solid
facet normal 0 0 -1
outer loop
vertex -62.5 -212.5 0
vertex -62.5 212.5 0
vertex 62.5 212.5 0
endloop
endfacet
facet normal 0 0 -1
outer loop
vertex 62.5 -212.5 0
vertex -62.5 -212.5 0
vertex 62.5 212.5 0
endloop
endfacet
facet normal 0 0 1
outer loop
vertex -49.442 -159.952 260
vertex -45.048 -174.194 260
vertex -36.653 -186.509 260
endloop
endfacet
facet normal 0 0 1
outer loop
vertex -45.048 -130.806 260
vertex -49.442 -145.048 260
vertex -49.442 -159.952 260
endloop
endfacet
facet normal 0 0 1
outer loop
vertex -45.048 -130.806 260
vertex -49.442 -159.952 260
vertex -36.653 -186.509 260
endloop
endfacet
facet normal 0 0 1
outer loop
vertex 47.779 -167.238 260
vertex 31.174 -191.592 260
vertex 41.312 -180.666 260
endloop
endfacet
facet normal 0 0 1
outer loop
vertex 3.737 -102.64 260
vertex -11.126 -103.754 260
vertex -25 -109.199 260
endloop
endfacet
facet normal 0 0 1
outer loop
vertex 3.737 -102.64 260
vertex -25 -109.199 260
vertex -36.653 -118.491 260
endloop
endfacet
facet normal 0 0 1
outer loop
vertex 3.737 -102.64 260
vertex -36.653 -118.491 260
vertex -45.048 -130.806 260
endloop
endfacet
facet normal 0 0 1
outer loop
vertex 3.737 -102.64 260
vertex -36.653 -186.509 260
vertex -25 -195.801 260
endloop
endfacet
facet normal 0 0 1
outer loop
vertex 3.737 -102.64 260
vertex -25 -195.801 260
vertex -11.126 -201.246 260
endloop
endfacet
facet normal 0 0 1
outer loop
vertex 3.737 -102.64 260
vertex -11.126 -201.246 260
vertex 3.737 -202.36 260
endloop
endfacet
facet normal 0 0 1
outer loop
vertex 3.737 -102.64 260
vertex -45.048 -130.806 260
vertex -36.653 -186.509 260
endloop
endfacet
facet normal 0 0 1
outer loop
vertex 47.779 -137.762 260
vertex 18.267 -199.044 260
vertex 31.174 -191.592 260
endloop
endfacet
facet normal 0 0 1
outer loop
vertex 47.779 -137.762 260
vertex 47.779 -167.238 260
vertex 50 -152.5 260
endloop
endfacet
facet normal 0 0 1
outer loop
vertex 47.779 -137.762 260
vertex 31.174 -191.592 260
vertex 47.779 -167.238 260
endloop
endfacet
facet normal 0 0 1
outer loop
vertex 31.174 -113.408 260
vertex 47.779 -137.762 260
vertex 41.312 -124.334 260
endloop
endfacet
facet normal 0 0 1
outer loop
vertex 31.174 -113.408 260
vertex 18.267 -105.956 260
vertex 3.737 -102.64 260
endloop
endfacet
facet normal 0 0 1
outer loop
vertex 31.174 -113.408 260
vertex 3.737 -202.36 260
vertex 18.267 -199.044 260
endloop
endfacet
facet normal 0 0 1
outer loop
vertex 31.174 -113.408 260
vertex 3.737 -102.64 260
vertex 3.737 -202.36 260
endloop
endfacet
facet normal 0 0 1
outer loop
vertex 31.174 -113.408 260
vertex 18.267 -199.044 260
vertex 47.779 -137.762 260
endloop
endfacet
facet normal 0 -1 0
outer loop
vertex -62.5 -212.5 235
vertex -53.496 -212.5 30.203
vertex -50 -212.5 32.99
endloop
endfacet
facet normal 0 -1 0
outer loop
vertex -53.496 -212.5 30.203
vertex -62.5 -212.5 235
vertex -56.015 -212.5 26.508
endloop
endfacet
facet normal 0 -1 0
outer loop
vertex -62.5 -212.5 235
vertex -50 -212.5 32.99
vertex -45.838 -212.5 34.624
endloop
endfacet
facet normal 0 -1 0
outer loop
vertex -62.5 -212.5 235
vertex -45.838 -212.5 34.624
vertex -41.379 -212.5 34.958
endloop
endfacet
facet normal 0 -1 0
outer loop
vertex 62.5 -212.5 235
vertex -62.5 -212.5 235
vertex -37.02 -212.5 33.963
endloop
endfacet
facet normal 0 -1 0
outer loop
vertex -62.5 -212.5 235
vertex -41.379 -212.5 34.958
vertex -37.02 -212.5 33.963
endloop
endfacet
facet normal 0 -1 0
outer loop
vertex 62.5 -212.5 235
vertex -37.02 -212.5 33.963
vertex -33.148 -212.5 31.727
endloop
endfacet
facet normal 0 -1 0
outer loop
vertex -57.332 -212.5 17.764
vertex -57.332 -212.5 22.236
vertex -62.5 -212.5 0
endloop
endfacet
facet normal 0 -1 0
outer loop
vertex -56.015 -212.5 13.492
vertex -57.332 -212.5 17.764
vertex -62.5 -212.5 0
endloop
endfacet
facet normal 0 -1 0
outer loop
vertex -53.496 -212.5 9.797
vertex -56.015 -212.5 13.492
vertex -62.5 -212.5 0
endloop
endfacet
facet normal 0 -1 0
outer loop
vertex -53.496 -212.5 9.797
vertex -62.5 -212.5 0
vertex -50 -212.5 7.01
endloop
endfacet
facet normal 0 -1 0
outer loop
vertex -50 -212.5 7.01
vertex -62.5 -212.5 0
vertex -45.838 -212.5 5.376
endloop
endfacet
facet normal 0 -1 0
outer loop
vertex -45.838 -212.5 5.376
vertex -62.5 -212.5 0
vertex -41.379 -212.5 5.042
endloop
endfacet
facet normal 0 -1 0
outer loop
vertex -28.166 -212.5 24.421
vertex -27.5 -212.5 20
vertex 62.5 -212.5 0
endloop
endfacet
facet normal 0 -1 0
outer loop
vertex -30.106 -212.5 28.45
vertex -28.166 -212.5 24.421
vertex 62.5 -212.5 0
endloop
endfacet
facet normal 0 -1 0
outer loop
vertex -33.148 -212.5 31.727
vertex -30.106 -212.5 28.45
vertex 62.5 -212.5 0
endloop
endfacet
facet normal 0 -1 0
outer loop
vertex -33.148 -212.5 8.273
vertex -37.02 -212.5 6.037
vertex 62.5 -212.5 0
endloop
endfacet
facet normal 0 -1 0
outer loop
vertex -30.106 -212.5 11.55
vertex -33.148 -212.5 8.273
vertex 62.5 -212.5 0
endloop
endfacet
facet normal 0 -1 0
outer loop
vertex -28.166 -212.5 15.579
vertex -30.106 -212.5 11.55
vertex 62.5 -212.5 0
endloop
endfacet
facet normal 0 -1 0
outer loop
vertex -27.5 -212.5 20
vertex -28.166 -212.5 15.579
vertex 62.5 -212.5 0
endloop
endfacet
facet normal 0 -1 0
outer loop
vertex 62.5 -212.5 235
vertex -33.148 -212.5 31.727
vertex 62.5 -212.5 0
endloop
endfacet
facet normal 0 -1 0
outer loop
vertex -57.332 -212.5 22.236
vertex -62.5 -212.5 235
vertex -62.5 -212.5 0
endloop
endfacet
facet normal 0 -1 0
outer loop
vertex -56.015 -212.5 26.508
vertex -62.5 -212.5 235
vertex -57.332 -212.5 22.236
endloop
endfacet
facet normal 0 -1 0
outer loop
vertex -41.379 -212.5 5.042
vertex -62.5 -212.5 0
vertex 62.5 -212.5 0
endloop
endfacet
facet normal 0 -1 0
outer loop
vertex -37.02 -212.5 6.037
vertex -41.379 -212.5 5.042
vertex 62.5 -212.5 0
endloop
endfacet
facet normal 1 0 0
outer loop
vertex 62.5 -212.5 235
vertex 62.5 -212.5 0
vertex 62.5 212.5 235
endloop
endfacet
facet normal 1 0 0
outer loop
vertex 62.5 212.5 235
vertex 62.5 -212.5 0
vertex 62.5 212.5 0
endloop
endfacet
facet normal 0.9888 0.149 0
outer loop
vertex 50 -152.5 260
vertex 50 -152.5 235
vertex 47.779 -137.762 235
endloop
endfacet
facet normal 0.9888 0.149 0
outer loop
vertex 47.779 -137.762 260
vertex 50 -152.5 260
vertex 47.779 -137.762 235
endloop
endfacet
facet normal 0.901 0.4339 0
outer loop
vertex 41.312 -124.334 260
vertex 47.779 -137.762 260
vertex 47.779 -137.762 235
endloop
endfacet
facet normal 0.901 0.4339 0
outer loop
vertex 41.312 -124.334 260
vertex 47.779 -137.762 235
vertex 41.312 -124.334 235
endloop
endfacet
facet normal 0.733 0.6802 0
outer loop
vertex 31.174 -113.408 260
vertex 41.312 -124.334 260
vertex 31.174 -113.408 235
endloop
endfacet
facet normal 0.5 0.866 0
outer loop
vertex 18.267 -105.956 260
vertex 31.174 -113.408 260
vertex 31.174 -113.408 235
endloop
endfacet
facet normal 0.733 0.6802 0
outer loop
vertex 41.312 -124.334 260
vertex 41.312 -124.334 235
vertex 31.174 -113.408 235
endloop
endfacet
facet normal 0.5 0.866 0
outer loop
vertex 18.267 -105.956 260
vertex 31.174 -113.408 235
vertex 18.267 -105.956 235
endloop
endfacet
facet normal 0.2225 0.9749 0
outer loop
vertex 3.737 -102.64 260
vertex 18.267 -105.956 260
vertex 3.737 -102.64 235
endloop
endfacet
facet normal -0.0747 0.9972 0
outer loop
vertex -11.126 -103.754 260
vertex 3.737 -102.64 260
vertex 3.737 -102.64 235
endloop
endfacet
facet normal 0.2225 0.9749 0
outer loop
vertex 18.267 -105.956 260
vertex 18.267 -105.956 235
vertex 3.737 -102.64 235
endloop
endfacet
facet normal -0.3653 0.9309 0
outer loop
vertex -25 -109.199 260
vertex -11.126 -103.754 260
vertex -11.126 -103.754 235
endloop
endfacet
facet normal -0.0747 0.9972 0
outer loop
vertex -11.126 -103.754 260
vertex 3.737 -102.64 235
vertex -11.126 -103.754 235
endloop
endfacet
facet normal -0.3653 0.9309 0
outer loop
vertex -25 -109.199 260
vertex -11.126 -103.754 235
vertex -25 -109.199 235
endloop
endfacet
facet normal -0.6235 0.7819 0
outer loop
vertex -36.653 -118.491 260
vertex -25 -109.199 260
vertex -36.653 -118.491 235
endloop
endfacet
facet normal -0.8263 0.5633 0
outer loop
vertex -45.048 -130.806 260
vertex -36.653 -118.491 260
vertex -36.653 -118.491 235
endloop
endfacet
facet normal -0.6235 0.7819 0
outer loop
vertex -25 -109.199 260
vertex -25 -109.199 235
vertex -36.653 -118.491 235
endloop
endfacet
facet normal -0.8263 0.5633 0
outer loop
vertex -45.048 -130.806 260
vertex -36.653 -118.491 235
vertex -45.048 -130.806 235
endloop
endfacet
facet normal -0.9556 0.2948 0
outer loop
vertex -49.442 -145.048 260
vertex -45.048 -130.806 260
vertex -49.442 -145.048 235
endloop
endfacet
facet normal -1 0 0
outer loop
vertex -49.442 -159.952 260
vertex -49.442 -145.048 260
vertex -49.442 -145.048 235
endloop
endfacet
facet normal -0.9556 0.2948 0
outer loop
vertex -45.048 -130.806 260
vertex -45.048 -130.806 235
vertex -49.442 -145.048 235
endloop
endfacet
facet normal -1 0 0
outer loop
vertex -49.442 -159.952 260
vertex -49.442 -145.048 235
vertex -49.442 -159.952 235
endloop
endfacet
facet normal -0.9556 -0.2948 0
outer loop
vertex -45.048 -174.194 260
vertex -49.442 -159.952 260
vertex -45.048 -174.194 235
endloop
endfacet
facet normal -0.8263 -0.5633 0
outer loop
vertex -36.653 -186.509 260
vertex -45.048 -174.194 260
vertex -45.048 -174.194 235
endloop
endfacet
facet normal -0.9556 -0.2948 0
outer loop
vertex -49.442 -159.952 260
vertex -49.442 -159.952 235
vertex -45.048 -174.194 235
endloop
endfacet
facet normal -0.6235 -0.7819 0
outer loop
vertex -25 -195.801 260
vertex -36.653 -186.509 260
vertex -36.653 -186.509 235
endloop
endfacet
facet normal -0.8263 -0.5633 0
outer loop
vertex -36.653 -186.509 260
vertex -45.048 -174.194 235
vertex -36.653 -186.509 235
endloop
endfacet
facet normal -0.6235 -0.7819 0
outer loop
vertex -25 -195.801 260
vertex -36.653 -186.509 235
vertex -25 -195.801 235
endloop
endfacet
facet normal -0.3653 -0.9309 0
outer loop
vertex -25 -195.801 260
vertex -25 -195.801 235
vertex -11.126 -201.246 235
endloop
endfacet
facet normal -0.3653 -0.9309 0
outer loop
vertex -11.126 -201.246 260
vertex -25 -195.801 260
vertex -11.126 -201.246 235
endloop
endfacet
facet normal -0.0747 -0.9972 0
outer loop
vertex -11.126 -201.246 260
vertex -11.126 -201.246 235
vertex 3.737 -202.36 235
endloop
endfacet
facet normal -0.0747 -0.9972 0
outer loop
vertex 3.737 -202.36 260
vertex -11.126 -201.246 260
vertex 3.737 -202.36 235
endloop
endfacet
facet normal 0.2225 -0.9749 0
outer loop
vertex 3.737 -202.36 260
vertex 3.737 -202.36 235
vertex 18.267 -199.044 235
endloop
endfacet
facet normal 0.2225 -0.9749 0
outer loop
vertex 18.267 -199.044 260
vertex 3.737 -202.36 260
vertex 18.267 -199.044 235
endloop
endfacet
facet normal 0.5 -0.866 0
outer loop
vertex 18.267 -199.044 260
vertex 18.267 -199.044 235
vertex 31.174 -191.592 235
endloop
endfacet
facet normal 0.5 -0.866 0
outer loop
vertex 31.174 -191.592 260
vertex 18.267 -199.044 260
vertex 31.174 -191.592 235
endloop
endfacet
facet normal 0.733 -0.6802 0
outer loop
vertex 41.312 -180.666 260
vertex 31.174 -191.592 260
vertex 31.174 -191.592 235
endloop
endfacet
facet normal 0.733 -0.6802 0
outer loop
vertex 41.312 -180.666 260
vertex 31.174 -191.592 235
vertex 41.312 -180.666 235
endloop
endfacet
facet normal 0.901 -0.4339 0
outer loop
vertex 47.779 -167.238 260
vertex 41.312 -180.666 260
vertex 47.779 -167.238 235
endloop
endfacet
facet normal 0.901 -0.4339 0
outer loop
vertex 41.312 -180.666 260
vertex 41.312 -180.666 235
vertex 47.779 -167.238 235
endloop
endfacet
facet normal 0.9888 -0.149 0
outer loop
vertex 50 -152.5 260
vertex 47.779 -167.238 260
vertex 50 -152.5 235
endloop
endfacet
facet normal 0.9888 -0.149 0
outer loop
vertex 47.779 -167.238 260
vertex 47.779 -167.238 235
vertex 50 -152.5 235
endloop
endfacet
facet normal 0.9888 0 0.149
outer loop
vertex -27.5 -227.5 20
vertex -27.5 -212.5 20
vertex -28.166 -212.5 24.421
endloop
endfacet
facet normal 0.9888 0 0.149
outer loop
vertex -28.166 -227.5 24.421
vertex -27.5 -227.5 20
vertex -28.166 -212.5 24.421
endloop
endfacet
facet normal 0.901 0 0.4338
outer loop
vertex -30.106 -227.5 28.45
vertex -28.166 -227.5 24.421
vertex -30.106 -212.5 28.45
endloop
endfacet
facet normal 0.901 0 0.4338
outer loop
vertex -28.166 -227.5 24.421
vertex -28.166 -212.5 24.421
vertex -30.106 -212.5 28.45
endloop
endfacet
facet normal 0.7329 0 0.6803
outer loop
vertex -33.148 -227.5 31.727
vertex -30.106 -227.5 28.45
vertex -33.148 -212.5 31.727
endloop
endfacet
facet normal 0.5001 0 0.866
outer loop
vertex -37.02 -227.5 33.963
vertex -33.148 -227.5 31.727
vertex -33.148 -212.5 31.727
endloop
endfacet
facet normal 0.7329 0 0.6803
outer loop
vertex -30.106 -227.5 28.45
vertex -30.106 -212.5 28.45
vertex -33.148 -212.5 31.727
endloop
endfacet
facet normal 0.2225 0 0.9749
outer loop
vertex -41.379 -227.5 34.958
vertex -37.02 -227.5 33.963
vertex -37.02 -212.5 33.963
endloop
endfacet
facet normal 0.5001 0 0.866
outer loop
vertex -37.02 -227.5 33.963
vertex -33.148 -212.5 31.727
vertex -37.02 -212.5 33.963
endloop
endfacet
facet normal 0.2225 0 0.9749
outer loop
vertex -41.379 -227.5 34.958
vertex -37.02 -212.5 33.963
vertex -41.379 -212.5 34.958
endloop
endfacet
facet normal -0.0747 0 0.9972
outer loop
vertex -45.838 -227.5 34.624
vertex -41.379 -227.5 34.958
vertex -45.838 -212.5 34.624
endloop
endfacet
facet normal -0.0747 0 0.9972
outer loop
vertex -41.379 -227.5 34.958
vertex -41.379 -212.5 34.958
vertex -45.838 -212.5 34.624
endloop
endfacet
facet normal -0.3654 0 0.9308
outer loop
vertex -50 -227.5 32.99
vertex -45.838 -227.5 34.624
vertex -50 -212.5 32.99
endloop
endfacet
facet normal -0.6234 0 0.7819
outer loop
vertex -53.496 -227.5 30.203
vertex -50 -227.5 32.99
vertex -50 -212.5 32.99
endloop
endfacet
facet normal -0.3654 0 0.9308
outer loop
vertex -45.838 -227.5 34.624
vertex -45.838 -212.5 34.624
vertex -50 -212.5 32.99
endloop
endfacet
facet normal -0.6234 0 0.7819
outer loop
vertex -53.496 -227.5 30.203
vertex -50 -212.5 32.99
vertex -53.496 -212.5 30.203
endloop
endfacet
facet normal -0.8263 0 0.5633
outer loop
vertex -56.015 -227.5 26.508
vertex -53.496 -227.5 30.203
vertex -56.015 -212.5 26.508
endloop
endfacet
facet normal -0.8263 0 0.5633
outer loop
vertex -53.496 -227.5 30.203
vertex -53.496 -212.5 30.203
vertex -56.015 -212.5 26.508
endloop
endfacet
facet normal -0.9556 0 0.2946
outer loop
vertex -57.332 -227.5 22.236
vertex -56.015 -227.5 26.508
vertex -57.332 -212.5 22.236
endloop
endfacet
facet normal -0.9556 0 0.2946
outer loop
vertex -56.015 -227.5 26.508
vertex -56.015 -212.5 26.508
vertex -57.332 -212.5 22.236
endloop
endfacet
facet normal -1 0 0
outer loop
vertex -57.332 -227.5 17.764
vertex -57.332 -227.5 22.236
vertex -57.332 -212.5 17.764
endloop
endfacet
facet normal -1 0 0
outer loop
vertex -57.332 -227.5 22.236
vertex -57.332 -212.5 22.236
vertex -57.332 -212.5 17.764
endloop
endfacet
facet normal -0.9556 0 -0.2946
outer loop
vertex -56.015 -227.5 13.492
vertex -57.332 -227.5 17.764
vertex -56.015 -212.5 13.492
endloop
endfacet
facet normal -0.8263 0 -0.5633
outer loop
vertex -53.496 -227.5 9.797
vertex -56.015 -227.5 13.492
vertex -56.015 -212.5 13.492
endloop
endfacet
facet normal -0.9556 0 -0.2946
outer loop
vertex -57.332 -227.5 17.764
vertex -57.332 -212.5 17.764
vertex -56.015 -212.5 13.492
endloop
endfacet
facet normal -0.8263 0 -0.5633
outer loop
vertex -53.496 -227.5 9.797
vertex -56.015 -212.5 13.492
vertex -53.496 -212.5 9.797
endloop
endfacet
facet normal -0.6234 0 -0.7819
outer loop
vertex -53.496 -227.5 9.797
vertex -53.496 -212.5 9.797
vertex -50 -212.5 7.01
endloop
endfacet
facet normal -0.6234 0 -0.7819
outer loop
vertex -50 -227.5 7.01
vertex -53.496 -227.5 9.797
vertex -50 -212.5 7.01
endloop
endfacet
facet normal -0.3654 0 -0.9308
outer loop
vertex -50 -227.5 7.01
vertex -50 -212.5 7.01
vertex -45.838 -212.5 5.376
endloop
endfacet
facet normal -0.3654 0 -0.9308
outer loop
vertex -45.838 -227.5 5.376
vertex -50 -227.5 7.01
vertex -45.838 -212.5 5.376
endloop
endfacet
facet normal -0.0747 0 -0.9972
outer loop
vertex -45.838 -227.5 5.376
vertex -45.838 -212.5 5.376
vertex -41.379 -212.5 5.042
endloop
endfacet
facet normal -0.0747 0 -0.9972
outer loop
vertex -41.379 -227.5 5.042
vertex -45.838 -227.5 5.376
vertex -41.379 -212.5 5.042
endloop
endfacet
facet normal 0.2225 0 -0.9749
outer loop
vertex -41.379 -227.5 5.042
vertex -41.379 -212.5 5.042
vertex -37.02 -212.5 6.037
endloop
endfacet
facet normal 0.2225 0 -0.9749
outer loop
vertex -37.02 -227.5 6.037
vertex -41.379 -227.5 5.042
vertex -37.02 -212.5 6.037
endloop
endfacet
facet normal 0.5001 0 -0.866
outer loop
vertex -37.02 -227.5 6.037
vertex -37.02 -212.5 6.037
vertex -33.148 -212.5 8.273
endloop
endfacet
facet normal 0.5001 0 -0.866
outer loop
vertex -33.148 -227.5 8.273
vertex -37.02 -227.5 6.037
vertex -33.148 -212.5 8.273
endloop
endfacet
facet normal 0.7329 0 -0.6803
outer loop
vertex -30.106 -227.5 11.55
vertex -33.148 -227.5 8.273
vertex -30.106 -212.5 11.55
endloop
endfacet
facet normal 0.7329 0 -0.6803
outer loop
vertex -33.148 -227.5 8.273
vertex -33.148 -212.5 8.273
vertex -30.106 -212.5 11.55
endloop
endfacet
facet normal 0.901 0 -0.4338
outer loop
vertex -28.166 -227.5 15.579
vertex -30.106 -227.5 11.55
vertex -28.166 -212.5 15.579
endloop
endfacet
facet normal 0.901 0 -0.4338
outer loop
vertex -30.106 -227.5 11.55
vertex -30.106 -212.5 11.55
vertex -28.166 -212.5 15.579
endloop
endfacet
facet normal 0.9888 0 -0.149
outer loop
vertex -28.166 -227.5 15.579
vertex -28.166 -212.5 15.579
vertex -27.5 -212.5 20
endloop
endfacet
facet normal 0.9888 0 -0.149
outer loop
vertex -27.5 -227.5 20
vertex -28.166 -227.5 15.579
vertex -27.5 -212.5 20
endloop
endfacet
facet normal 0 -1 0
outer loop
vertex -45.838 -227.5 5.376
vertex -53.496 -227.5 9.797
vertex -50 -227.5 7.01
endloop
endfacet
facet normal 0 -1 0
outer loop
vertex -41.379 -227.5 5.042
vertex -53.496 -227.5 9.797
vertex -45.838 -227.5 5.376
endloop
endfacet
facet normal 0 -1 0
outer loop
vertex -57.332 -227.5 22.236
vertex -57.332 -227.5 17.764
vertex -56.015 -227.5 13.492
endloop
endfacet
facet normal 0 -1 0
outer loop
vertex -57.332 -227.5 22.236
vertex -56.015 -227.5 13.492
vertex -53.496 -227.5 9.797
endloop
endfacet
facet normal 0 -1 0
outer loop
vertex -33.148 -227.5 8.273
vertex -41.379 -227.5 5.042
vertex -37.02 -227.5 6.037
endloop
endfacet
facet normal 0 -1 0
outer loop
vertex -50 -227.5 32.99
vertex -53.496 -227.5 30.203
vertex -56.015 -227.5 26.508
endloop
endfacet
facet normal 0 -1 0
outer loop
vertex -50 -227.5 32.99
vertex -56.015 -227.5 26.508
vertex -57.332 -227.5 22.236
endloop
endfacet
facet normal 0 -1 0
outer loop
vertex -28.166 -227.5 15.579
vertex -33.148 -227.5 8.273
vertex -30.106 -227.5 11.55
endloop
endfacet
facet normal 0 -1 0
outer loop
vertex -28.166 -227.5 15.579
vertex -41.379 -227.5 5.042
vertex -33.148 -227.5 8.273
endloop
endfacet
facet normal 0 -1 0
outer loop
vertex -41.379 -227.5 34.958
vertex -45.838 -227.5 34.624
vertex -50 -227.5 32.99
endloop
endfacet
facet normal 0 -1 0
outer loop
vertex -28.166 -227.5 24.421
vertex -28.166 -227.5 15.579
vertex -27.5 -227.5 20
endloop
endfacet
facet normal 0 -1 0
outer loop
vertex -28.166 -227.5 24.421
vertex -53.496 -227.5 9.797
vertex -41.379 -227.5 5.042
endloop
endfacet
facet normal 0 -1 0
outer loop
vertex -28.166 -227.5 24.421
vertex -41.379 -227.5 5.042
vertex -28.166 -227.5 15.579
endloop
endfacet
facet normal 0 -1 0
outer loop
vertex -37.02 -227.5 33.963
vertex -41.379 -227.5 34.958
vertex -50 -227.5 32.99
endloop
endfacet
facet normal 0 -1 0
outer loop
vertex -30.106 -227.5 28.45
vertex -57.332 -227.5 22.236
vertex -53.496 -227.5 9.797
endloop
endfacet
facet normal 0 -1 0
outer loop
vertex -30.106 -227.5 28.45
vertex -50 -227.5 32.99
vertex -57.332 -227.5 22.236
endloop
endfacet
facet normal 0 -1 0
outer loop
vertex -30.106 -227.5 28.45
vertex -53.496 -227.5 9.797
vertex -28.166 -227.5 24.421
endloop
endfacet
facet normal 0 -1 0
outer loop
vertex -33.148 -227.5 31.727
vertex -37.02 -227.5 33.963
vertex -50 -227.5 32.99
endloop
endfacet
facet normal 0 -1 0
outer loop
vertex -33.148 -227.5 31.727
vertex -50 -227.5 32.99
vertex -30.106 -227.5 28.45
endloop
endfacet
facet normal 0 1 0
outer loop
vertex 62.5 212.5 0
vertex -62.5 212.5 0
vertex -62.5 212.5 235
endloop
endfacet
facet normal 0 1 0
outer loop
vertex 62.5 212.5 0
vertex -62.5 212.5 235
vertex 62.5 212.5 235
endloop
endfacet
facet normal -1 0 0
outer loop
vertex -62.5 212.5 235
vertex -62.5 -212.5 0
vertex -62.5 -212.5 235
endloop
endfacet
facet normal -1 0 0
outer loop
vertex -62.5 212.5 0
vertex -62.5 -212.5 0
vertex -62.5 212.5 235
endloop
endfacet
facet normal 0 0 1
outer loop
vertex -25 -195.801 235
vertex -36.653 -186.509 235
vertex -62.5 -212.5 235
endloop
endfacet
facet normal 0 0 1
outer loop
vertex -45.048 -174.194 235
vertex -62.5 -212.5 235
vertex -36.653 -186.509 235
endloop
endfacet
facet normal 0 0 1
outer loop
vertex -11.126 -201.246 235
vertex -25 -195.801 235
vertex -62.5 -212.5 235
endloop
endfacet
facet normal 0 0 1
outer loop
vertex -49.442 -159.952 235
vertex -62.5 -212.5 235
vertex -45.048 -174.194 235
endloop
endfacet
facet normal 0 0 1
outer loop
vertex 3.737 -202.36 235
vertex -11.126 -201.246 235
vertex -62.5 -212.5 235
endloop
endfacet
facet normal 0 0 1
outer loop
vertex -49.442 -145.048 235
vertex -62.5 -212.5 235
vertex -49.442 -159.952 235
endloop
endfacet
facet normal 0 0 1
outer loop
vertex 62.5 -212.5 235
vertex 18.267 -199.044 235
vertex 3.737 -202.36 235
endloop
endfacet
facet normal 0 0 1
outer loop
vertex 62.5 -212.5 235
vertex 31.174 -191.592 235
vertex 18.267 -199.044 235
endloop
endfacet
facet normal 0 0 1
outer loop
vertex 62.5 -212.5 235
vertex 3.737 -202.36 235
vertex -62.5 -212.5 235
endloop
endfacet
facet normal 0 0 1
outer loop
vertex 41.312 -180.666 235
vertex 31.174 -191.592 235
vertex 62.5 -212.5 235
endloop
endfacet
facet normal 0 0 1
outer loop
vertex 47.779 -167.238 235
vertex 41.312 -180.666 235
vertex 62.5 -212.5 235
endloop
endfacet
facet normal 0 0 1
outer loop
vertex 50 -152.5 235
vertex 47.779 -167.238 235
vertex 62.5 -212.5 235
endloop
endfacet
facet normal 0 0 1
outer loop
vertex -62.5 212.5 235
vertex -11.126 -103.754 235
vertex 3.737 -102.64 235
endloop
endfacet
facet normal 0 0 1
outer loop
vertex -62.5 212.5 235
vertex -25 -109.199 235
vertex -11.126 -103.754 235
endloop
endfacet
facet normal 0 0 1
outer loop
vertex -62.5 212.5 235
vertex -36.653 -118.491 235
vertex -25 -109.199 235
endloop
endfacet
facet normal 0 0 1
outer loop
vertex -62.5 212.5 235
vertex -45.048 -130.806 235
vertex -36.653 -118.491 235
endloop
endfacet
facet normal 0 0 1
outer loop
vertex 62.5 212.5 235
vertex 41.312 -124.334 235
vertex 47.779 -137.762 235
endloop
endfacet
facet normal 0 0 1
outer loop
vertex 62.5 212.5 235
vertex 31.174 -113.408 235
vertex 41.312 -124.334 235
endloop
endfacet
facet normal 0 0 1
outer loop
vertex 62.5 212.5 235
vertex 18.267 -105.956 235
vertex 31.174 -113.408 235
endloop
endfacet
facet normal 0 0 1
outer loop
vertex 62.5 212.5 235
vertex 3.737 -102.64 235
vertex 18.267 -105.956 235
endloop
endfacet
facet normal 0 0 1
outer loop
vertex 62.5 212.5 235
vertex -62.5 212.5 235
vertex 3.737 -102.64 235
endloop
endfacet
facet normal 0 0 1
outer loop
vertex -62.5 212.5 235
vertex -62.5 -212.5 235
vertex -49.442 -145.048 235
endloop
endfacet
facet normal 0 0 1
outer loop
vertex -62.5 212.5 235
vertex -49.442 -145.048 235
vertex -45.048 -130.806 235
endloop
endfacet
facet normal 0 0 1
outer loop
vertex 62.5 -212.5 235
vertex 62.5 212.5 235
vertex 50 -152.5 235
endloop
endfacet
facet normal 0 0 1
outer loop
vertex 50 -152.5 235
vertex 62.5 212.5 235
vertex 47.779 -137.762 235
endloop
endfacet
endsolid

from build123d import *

# Parameters (mm, degrees)
F0_W     = 125
F0_H     = 425
F1_DEPTH = 235
F2_R     = 15
F3_DEPTH = 15
F4_R     = 50
F5_DEPTH = 25


with BuildPart() as f1:
    # F0 (on Top) → F1 (new body)
    with BuildSketch(Plane.XY):
        Rectangle(F0_W, F0_H)
    extrude(amount=F1_DEPTH)

    # F2 (on face) → F3 (join)
    with BuildSketch(Plane.XZ.offset(212.5)):
        with Locations((-42.5, 20)):
            Circle(F2_R)
    extrude(amount=F3_DEPTH)

    # F4 (on face) → F5 (join)
    with BuildSketch(Plane.XY.offset(235)):
        with Locations((0, -152.5)):
            Circle(F4_R)
    extrude(amount=F5_DEPTH)


solid = f1.part
